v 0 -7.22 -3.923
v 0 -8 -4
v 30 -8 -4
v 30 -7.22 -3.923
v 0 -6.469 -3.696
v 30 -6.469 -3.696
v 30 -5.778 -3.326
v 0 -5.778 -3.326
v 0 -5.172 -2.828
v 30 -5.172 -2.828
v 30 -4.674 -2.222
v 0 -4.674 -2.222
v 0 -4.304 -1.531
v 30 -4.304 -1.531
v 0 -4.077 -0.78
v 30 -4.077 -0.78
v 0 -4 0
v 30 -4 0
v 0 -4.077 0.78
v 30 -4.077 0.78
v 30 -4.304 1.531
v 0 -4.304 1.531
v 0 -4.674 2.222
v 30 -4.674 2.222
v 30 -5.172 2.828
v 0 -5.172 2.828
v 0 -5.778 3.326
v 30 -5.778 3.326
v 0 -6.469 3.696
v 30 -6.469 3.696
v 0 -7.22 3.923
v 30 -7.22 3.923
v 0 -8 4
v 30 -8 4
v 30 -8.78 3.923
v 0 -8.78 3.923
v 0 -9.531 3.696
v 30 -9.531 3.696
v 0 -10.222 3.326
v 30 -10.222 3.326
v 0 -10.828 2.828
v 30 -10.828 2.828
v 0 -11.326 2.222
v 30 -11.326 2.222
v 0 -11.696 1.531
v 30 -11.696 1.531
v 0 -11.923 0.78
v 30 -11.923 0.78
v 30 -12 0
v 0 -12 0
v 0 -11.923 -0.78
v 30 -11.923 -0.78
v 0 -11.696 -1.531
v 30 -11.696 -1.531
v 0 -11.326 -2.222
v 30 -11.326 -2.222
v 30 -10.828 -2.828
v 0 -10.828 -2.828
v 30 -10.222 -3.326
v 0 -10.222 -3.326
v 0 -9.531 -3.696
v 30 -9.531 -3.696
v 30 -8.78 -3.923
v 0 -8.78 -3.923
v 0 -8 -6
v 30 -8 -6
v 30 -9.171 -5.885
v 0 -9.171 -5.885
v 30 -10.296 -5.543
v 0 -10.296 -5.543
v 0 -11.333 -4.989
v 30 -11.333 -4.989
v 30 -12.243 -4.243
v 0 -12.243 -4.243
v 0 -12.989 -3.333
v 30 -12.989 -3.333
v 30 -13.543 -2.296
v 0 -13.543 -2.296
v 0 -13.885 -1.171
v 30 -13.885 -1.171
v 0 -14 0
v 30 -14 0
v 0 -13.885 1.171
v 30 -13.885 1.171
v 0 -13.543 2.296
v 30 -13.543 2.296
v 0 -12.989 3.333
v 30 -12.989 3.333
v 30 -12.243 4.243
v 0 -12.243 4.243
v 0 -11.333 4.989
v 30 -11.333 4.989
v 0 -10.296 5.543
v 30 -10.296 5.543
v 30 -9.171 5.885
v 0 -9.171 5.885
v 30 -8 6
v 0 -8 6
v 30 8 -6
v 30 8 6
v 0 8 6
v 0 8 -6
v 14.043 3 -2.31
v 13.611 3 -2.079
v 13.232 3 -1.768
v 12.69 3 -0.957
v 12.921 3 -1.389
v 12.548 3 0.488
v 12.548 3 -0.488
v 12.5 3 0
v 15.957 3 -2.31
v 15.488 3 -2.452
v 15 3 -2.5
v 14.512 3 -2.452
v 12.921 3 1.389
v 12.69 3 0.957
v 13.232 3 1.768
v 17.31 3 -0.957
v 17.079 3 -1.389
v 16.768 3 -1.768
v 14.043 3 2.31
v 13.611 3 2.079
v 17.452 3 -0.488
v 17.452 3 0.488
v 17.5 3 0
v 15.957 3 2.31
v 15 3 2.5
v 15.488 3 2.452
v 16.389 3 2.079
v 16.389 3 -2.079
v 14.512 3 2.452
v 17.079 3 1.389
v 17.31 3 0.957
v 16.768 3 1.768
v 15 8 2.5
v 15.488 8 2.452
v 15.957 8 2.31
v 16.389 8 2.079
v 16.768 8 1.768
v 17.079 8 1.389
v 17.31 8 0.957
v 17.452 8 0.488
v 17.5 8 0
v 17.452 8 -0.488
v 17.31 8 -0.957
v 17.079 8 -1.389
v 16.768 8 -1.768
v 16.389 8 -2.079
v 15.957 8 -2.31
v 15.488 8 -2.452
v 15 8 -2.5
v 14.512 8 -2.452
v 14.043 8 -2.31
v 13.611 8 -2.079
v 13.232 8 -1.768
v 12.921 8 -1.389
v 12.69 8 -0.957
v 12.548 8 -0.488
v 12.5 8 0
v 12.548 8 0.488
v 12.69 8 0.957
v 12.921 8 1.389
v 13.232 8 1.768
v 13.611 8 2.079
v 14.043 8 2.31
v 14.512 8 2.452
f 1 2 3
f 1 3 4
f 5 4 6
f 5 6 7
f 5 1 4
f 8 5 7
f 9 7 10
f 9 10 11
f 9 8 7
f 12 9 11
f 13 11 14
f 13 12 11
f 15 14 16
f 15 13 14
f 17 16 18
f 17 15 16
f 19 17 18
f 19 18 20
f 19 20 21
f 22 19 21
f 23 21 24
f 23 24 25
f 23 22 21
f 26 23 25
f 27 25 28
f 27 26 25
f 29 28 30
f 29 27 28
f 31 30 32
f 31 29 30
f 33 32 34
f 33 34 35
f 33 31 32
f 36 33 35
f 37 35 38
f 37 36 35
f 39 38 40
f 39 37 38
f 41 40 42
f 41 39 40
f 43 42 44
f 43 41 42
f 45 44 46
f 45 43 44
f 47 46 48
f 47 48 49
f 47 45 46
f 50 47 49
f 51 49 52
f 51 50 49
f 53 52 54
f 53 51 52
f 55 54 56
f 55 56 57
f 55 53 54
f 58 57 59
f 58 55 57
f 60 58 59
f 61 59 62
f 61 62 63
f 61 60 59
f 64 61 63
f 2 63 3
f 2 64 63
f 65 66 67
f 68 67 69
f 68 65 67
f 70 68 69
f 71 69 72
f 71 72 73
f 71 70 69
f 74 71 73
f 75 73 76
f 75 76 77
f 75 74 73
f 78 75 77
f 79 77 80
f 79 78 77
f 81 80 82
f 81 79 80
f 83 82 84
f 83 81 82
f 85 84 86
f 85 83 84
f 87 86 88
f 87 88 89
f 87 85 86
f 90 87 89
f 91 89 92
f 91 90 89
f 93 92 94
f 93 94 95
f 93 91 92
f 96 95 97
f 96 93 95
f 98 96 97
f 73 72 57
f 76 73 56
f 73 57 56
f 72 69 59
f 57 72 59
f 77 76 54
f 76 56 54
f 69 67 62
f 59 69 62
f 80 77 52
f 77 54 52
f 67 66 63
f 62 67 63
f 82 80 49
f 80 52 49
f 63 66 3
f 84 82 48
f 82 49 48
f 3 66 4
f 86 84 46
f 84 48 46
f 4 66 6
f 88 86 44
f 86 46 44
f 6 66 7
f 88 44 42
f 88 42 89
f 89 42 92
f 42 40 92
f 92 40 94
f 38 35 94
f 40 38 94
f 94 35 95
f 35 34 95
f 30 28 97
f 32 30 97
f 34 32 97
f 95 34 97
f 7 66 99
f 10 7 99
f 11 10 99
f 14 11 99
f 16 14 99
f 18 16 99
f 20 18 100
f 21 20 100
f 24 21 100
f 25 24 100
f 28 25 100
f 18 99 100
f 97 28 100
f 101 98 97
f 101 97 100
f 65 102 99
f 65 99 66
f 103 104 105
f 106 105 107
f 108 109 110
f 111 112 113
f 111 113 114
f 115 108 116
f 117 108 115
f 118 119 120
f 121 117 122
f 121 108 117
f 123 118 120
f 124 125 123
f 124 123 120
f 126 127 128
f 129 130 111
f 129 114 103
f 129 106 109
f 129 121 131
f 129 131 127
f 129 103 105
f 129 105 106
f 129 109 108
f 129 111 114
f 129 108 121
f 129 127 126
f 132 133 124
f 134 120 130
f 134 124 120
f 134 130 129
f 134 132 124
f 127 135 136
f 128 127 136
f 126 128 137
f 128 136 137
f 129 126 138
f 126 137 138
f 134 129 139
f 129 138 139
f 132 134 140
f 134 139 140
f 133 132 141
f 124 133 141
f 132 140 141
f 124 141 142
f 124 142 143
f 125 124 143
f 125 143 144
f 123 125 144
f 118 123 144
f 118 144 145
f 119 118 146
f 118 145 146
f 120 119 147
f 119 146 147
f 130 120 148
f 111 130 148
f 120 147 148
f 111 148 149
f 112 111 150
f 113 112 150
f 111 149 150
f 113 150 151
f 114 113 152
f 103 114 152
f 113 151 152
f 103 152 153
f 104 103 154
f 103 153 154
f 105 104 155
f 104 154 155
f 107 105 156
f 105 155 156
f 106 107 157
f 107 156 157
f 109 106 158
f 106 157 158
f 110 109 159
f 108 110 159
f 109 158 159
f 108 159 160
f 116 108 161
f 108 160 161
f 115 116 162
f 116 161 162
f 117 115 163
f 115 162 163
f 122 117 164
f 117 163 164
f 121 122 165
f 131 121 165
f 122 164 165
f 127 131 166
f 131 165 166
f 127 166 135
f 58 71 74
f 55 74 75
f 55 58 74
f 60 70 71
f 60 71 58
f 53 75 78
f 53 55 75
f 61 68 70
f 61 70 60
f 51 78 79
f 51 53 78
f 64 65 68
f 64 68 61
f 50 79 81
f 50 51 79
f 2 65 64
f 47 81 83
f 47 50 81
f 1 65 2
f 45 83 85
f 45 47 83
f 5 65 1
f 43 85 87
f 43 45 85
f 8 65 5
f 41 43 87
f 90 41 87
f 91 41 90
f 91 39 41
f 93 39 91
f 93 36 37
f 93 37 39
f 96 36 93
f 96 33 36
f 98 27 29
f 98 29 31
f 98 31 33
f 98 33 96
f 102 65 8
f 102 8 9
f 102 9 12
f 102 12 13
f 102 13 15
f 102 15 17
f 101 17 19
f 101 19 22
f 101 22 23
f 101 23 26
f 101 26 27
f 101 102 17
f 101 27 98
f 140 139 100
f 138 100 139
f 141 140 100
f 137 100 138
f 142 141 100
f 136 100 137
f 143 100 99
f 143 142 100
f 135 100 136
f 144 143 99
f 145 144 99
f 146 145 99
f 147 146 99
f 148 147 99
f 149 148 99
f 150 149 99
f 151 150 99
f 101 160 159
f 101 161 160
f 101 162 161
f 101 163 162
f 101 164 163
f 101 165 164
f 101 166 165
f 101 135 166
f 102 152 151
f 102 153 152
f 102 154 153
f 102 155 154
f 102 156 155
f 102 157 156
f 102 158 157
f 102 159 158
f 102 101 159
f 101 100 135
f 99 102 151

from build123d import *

# Parameters (mm, degrees)
SKETCH1_R           = 4
BOSS_EXTRUDE1_DEPTH = 30
SKETCH2_R           = 2.5
CUT_EXTRUDE1_DEPTH  = 5


with BuildPart() as part:
    # Sketch1 → Boss-Extrude1 (new body)
    with BuildSketch(Plane(origin=(0, 0, 0), x_dir=(0, 0, -1), z_dir=(1, 0, 0))):
        with BuildLine():
            Line((-6, 8), (6, 8))
            Line((6, 8), (6, -8))
            ThreePointArc((6, -8), (0, -14), (-6, -8))
            Line((-6, -8), (-6, 8))
        make_face()
        with Locations((0, -8)):
            Circle(SKETCH1_R, mode=Mode.SUBTRACT)
    extrude(amount=BOSS_EXTRUDE1_DEPTH)

    # Sketch2 → Cut-Extrude1 (cut)
    with BuildSketch(Plane(origin=(0, 8, 0), x_dir=(1, 0, 0), z_dir=(0, 1, 0))):
        with Locations(Location((15, 0, 0), (0, 0, 270))):
            Circle(SKETCH2_R)
    extrude(amount=-CUT_EXTRUDE1_DEPTH, mode=Mode.SUBTRACT)


solid = part.part
